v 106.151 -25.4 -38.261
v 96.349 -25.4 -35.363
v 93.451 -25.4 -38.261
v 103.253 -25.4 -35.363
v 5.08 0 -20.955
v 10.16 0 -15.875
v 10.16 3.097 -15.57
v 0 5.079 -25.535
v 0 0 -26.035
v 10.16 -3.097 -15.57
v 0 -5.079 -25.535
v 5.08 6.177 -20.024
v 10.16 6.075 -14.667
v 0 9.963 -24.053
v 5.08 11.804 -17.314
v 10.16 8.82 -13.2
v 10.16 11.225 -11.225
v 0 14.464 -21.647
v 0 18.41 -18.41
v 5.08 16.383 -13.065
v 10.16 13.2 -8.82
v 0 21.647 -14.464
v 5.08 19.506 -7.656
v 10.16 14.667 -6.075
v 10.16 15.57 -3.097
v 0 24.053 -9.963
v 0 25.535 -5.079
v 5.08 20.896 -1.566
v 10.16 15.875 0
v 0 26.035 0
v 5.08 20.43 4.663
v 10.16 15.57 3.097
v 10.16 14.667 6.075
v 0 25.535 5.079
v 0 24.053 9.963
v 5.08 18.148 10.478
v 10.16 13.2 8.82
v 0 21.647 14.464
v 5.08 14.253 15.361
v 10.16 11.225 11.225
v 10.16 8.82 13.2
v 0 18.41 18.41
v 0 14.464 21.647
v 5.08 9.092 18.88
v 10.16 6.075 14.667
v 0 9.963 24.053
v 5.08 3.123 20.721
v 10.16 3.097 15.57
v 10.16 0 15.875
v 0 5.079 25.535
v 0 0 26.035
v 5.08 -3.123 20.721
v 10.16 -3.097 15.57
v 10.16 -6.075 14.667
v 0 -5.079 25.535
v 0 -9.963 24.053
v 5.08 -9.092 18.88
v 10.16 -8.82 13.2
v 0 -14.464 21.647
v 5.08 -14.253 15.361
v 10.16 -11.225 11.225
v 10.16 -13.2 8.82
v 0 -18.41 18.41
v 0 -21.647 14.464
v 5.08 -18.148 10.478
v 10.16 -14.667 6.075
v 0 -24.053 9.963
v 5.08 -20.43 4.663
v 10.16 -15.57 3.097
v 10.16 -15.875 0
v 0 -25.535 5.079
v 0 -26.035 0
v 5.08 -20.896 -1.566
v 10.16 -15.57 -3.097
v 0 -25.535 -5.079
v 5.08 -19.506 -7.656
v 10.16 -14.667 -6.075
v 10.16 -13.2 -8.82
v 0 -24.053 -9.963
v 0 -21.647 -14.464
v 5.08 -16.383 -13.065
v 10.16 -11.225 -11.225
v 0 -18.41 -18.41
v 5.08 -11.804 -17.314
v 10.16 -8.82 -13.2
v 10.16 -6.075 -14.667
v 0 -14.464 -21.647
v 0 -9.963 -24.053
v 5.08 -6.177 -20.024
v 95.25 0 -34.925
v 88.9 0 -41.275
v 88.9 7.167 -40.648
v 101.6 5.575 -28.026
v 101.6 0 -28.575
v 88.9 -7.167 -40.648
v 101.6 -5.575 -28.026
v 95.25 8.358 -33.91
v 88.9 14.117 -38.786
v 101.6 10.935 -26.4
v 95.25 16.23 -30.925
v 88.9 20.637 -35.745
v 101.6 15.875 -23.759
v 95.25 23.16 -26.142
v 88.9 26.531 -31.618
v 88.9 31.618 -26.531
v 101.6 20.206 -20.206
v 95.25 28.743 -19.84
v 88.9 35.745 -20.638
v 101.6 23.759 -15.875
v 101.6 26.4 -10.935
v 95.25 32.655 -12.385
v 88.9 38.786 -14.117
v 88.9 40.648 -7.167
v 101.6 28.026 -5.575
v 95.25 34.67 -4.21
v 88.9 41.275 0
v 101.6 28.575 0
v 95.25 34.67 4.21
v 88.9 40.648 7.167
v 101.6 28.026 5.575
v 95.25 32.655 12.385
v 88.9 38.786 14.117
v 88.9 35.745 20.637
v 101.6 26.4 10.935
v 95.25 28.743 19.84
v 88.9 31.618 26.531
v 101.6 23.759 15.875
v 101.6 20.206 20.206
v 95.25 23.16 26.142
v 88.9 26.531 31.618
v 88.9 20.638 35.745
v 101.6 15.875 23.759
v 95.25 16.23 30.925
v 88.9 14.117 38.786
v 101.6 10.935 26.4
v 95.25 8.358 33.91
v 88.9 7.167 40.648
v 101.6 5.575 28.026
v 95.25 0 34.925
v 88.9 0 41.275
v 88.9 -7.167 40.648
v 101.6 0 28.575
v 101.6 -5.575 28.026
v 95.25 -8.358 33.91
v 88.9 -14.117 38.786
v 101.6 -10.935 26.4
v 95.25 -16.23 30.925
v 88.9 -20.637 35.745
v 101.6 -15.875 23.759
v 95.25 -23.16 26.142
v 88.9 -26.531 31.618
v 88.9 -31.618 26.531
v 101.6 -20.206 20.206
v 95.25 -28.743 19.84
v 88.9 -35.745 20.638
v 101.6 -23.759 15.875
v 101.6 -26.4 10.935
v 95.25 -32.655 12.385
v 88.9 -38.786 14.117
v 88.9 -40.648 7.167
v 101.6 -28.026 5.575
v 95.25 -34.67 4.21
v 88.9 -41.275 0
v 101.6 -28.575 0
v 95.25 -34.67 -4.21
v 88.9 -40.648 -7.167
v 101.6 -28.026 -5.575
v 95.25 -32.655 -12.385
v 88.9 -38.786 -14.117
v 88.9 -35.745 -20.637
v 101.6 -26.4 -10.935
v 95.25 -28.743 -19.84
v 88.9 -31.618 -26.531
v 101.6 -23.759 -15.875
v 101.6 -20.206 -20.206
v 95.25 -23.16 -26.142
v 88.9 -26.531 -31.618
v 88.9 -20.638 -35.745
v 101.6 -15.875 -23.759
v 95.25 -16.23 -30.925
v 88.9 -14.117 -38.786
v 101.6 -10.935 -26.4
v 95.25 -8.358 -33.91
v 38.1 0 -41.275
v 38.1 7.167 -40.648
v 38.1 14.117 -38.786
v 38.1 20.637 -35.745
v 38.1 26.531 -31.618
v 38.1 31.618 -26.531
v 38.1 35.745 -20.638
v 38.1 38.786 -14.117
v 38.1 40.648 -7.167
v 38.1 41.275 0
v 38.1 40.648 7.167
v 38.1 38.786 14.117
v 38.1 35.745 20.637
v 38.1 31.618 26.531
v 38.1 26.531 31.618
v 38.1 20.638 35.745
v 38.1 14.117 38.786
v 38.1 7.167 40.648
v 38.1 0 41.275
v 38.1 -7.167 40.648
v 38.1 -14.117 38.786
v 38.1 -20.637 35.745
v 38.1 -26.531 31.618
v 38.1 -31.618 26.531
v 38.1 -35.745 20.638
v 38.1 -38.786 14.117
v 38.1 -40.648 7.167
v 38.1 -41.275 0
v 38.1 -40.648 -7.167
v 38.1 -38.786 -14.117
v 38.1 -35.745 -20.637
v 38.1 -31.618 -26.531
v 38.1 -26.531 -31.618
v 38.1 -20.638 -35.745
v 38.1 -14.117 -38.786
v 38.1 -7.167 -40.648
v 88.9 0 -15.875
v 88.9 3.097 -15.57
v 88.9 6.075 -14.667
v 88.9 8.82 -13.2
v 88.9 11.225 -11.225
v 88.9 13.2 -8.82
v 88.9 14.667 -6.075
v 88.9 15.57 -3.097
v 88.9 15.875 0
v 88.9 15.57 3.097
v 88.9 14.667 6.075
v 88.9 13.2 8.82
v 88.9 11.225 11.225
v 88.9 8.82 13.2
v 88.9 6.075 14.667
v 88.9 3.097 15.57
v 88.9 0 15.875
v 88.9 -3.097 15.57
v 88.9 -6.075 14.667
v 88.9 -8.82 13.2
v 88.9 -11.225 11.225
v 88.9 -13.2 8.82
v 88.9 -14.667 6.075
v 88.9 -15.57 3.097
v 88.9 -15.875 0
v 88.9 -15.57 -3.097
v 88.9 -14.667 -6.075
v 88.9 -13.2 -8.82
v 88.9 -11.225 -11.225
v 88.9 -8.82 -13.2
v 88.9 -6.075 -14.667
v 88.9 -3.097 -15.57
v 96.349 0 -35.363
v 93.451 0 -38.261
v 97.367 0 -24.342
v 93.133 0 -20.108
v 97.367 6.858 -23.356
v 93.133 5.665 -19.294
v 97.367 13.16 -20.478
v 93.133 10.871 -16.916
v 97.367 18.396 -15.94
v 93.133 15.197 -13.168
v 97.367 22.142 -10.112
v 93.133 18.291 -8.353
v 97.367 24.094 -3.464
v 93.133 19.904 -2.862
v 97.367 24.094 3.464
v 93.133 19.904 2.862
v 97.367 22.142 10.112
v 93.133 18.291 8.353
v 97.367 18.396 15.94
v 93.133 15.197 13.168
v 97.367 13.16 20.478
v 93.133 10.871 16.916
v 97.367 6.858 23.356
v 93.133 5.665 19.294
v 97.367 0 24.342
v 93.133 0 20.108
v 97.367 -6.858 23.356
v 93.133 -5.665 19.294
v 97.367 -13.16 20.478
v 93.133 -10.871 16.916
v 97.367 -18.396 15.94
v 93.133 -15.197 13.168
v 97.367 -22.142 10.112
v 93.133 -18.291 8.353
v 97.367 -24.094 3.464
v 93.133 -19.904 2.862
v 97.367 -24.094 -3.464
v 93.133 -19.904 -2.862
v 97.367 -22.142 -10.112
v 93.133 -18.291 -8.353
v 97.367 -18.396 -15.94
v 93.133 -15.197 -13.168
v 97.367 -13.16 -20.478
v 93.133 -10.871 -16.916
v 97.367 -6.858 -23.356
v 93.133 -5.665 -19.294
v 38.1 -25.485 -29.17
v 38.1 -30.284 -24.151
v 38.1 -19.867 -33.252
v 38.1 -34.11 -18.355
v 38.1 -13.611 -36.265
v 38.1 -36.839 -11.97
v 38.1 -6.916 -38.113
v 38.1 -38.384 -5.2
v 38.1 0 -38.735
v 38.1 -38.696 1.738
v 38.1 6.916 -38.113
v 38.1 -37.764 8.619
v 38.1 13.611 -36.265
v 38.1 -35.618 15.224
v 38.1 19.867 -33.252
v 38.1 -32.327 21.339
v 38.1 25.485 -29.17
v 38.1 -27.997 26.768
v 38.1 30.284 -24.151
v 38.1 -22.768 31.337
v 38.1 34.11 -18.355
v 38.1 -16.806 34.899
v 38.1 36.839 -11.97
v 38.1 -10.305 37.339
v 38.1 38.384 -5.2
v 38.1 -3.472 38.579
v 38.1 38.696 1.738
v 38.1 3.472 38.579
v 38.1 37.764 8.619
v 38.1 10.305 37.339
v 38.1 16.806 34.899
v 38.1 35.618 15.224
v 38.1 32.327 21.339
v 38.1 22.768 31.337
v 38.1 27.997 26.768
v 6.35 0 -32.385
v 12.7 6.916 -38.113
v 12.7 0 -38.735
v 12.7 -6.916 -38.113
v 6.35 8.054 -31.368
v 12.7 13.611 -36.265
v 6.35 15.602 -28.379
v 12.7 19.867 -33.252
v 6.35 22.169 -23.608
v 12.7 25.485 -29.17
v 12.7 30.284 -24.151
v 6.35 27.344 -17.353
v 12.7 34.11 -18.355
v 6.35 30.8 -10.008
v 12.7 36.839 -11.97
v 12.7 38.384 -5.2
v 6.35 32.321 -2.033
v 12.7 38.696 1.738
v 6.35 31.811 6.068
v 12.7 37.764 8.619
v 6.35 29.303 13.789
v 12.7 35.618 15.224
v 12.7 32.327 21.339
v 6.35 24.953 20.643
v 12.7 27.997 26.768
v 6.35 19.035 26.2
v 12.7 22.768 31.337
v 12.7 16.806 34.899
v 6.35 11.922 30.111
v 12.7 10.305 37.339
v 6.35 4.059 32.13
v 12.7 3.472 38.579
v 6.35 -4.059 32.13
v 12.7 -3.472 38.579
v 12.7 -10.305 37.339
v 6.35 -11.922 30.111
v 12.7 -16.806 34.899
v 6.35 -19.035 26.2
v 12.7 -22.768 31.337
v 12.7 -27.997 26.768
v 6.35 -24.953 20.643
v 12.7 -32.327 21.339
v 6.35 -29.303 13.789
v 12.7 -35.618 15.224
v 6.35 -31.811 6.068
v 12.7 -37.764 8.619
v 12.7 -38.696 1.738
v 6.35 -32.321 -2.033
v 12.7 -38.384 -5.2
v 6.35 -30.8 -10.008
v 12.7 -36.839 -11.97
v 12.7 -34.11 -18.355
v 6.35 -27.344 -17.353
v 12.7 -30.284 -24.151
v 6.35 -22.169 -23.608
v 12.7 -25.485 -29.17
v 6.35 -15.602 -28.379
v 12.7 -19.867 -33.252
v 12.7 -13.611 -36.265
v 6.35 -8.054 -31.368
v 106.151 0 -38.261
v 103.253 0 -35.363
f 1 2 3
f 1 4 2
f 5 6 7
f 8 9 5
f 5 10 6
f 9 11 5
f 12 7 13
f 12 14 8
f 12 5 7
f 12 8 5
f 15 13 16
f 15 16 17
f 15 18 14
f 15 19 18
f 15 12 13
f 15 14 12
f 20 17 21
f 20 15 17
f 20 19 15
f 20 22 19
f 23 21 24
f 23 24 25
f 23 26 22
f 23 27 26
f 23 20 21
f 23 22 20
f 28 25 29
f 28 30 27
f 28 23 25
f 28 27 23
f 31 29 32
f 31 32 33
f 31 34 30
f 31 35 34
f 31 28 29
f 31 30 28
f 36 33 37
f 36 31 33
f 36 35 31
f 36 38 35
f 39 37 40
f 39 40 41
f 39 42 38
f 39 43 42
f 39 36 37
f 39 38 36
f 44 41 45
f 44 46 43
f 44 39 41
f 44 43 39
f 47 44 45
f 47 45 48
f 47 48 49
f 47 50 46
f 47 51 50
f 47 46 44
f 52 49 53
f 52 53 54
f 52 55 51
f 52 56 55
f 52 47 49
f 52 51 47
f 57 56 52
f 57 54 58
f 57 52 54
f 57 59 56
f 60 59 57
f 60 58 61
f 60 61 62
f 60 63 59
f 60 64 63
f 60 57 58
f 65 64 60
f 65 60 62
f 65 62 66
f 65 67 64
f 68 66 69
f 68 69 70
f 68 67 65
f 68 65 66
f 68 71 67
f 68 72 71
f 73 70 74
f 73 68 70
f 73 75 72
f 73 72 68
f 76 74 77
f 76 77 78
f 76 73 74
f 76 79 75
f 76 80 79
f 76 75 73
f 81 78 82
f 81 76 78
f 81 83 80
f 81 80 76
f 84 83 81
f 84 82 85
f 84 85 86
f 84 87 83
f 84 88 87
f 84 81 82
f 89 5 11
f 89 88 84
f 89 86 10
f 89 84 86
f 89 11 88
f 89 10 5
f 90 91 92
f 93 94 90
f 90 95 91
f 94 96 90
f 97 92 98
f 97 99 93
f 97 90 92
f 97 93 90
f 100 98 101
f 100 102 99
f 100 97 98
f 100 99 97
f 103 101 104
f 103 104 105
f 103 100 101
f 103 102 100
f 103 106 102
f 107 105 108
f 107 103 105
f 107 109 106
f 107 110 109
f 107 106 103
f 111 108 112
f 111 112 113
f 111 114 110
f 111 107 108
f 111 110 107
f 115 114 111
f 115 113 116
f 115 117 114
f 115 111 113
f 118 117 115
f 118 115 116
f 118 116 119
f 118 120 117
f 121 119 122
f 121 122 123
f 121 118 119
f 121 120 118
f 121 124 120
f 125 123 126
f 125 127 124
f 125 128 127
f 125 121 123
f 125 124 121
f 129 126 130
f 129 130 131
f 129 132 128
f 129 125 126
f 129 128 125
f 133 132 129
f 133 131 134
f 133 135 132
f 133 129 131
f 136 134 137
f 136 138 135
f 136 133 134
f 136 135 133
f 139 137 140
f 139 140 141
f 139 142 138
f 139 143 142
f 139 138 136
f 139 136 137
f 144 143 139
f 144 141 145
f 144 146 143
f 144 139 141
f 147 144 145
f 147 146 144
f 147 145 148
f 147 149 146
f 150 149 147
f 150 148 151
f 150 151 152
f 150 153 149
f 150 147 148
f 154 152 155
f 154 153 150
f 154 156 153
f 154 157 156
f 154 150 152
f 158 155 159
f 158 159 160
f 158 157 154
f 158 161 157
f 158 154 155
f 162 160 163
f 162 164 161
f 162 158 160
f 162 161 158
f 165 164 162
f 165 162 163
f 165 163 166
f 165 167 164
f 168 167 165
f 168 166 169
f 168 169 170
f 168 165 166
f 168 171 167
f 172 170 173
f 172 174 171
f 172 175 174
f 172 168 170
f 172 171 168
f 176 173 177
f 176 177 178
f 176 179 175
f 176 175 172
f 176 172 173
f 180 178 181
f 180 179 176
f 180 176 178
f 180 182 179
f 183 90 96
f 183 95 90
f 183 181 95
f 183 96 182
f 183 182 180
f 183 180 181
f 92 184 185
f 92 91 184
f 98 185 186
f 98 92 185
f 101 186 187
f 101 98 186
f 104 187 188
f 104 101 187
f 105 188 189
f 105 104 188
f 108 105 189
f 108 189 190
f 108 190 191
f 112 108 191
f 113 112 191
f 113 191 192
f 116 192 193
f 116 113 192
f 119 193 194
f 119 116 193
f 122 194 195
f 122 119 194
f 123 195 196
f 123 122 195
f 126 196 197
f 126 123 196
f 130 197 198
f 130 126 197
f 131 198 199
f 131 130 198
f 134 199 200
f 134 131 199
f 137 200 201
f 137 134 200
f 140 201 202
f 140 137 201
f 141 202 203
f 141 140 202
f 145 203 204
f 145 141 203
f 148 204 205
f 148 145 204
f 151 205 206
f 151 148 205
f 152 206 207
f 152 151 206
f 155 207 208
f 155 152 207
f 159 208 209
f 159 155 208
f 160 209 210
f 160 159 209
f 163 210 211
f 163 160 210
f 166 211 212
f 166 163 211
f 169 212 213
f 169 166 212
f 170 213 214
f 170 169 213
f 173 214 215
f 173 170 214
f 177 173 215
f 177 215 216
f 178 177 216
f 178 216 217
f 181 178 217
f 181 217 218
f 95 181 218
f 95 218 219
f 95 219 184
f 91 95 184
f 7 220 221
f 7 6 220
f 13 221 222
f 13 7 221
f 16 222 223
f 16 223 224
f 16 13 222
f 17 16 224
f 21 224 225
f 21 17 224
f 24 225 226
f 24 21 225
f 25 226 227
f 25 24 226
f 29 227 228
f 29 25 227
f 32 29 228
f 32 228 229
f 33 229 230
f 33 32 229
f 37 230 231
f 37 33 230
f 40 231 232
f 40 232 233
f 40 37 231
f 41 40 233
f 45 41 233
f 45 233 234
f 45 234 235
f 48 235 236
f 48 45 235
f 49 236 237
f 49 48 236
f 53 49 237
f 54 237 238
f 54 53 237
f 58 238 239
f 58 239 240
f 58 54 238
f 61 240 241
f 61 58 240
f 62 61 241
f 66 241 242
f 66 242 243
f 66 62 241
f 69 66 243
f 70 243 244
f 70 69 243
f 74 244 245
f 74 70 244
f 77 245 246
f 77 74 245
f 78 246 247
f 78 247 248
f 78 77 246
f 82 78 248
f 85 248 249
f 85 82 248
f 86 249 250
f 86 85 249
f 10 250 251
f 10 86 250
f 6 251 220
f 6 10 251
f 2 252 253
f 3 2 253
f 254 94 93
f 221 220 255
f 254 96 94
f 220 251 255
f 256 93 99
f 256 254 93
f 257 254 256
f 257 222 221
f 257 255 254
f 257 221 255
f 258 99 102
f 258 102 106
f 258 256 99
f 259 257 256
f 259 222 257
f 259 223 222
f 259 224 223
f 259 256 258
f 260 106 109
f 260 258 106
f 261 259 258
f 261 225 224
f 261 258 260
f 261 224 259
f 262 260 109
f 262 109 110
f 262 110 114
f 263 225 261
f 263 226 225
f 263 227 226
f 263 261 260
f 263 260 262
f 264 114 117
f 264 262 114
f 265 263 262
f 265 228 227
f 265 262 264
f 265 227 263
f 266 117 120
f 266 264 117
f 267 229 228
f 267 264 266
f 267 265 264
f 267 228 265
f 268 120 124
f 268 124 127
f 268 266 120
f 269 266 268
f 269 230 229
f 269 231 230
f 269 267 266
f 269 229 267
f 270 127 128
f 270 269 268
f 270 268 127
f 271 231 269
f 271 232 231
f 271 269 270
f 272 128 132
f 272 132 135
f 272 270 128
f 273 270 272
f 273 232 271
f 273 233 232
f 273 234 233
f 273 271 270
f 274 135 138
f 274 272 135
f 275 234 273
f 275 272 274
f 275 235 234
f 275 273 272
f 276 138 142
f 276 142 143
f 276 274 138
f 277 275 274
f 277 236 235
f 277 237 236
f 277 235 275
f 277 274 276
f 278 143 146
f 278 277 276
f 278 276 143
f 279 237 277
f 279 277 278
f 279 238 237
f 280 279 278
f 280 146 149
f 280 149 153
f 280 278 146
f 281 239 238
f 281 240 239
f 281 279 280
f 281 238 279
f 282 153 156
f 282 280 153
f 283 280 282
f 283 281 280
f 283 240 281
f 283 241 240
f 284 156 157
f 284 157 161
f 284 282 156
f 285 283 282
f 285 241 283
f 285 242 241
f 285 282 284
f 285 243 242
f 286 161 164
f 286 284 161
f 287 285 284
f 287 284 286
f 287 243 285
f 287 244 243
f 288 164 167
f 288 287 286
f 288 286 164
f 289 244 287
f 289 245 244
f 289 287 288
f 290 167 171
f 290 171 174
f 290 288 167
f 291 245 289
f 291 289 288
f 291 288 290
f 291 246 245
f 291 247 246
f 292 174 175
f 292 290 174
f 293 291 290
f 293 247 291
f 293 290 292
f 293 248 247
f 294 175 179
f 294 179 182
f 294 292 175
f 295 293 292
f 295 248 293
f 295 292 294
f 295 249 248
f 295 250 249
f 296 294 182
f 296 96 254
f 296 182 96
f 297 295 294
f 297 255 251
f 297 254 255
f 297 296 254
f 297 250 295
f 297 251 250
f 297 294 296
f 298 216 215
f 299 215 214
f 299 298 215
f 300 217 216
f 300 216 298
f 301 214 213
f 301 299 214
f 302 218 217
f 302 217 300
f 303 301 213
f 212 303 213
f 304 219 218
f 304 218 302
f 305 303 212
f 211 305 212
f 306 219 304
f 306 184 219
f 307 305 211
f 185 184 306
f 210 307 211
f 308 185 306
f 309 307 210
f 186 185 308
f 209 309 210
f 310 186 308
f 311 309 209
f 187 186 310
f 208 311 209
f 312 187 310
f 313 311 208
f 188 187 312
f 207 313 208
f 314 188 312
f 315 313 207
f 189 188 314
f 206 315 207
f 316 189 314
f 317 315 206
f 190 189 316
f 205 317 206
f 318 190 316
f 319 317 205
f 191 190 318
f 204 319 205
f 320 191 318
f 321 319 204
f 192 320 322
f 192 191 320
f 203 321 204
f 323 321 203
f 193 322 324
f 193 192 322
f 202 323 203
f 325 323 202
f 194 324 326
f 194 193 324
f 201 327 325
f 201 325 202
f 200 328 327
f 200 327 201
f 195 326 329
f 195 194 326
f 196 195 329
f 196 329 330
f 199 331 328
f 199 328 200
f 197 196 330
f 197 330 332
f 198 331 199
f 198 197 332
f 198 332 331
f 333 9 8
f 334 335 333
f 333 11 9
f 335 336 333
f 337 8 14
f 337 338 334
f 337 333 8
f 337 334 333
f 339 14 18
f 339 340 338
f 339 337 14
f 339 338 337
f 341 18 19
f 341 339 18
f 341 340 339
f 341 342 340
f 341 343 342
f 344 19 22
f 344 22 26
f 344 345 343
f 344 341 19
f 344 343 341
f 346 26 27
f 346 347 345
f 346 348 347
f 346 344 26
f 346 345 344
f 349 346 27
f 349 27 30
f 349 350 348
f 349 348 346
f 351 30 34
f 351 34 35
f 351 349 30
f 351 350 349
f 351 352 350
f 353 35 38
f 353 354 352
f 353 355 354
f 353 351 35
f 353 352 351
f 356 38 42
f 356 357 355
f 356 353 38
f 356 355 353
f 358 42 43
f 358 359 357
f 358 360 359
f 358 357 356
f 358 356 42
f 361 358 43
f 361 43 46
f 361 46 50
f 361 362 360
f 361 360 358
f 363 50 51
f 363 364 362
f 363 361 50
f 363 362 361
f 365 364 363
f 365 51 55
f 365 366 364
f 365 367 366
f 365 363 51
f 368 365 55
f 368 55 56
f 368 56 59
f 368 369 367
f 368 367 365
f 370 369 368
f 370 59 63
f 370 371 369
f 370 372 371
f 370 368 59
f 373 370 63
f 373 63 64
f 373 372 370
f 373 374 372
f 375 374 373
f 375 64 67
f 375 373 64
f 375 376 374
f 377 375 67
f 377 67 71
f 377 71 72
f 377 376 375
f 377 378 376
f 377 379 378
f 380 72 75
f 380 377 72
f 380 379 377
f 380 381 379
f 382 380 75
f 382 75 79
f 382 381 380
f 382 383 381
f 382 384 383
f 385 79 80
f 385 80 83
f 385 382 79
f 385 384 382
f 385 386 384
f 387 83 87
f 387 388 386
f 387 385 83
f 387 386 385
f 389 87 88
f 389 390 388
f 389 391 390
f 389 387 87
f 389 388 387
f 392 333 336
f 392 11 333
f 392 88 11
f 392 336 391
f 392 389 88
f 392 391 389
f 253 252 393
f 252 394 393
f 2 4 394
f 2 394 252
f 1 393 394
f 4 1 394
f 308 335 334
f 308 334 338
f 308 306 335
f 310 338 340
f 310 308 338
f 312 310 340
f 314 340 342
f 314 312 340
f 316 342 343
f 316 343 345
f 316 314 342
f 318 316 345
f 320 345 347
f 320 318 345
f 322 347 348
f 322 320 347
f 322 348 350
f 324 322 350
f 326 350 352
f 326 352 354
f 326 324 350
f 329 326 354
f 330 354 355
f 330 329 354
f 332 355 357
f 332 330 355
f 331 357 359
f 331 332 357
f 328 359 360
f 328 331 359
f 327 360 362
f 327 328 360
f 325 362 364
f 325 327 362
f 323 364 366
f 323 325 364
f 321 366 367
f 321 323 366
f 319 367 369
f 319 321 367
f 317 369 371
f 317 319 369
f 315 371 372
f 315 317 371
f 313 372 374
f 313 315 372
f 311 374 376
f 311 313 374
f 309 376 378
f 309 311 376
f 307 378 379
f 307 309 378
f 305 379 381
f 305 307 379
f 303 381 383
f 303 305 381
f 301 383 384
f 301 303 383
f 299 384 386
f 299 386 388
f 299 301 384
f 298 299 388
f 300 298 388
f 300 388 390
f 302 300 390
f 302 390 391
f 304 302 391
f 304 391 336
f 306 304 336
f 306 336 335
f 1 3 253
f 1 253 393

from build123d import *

# Parameters (mm, degrees)
F3_DEPTH = 25.4


with BuildPart() as f1:
    # F0 (on Front) → F1 (revolve)
    with BuildSketch(Plane.XZ):
        Polygon((10.16, -15.875), (0, -26.035), (12.7, -38.735), (38.1, -38.735), (38.1, -41.275), (88.9, -41.275), (101.6, -28.575), (88.9, -15.875), align=None)
    revolve(axis=Axis((51.171116, 0, 0), (1, 0, 0)))


with BuildPart() as f3:
    # F2 (on Front) → F3 (new body)
    with BuildSketch(Plane.XZ):
        Polygon((96.348617, -35.363365), (93.45082, -38.261162), (106.15082, -38.261162), (103.253023, -35.363365), align=None)
    extrude(amount=F3_DEPTH)


solid = Compound([f1.part, f3.part])
